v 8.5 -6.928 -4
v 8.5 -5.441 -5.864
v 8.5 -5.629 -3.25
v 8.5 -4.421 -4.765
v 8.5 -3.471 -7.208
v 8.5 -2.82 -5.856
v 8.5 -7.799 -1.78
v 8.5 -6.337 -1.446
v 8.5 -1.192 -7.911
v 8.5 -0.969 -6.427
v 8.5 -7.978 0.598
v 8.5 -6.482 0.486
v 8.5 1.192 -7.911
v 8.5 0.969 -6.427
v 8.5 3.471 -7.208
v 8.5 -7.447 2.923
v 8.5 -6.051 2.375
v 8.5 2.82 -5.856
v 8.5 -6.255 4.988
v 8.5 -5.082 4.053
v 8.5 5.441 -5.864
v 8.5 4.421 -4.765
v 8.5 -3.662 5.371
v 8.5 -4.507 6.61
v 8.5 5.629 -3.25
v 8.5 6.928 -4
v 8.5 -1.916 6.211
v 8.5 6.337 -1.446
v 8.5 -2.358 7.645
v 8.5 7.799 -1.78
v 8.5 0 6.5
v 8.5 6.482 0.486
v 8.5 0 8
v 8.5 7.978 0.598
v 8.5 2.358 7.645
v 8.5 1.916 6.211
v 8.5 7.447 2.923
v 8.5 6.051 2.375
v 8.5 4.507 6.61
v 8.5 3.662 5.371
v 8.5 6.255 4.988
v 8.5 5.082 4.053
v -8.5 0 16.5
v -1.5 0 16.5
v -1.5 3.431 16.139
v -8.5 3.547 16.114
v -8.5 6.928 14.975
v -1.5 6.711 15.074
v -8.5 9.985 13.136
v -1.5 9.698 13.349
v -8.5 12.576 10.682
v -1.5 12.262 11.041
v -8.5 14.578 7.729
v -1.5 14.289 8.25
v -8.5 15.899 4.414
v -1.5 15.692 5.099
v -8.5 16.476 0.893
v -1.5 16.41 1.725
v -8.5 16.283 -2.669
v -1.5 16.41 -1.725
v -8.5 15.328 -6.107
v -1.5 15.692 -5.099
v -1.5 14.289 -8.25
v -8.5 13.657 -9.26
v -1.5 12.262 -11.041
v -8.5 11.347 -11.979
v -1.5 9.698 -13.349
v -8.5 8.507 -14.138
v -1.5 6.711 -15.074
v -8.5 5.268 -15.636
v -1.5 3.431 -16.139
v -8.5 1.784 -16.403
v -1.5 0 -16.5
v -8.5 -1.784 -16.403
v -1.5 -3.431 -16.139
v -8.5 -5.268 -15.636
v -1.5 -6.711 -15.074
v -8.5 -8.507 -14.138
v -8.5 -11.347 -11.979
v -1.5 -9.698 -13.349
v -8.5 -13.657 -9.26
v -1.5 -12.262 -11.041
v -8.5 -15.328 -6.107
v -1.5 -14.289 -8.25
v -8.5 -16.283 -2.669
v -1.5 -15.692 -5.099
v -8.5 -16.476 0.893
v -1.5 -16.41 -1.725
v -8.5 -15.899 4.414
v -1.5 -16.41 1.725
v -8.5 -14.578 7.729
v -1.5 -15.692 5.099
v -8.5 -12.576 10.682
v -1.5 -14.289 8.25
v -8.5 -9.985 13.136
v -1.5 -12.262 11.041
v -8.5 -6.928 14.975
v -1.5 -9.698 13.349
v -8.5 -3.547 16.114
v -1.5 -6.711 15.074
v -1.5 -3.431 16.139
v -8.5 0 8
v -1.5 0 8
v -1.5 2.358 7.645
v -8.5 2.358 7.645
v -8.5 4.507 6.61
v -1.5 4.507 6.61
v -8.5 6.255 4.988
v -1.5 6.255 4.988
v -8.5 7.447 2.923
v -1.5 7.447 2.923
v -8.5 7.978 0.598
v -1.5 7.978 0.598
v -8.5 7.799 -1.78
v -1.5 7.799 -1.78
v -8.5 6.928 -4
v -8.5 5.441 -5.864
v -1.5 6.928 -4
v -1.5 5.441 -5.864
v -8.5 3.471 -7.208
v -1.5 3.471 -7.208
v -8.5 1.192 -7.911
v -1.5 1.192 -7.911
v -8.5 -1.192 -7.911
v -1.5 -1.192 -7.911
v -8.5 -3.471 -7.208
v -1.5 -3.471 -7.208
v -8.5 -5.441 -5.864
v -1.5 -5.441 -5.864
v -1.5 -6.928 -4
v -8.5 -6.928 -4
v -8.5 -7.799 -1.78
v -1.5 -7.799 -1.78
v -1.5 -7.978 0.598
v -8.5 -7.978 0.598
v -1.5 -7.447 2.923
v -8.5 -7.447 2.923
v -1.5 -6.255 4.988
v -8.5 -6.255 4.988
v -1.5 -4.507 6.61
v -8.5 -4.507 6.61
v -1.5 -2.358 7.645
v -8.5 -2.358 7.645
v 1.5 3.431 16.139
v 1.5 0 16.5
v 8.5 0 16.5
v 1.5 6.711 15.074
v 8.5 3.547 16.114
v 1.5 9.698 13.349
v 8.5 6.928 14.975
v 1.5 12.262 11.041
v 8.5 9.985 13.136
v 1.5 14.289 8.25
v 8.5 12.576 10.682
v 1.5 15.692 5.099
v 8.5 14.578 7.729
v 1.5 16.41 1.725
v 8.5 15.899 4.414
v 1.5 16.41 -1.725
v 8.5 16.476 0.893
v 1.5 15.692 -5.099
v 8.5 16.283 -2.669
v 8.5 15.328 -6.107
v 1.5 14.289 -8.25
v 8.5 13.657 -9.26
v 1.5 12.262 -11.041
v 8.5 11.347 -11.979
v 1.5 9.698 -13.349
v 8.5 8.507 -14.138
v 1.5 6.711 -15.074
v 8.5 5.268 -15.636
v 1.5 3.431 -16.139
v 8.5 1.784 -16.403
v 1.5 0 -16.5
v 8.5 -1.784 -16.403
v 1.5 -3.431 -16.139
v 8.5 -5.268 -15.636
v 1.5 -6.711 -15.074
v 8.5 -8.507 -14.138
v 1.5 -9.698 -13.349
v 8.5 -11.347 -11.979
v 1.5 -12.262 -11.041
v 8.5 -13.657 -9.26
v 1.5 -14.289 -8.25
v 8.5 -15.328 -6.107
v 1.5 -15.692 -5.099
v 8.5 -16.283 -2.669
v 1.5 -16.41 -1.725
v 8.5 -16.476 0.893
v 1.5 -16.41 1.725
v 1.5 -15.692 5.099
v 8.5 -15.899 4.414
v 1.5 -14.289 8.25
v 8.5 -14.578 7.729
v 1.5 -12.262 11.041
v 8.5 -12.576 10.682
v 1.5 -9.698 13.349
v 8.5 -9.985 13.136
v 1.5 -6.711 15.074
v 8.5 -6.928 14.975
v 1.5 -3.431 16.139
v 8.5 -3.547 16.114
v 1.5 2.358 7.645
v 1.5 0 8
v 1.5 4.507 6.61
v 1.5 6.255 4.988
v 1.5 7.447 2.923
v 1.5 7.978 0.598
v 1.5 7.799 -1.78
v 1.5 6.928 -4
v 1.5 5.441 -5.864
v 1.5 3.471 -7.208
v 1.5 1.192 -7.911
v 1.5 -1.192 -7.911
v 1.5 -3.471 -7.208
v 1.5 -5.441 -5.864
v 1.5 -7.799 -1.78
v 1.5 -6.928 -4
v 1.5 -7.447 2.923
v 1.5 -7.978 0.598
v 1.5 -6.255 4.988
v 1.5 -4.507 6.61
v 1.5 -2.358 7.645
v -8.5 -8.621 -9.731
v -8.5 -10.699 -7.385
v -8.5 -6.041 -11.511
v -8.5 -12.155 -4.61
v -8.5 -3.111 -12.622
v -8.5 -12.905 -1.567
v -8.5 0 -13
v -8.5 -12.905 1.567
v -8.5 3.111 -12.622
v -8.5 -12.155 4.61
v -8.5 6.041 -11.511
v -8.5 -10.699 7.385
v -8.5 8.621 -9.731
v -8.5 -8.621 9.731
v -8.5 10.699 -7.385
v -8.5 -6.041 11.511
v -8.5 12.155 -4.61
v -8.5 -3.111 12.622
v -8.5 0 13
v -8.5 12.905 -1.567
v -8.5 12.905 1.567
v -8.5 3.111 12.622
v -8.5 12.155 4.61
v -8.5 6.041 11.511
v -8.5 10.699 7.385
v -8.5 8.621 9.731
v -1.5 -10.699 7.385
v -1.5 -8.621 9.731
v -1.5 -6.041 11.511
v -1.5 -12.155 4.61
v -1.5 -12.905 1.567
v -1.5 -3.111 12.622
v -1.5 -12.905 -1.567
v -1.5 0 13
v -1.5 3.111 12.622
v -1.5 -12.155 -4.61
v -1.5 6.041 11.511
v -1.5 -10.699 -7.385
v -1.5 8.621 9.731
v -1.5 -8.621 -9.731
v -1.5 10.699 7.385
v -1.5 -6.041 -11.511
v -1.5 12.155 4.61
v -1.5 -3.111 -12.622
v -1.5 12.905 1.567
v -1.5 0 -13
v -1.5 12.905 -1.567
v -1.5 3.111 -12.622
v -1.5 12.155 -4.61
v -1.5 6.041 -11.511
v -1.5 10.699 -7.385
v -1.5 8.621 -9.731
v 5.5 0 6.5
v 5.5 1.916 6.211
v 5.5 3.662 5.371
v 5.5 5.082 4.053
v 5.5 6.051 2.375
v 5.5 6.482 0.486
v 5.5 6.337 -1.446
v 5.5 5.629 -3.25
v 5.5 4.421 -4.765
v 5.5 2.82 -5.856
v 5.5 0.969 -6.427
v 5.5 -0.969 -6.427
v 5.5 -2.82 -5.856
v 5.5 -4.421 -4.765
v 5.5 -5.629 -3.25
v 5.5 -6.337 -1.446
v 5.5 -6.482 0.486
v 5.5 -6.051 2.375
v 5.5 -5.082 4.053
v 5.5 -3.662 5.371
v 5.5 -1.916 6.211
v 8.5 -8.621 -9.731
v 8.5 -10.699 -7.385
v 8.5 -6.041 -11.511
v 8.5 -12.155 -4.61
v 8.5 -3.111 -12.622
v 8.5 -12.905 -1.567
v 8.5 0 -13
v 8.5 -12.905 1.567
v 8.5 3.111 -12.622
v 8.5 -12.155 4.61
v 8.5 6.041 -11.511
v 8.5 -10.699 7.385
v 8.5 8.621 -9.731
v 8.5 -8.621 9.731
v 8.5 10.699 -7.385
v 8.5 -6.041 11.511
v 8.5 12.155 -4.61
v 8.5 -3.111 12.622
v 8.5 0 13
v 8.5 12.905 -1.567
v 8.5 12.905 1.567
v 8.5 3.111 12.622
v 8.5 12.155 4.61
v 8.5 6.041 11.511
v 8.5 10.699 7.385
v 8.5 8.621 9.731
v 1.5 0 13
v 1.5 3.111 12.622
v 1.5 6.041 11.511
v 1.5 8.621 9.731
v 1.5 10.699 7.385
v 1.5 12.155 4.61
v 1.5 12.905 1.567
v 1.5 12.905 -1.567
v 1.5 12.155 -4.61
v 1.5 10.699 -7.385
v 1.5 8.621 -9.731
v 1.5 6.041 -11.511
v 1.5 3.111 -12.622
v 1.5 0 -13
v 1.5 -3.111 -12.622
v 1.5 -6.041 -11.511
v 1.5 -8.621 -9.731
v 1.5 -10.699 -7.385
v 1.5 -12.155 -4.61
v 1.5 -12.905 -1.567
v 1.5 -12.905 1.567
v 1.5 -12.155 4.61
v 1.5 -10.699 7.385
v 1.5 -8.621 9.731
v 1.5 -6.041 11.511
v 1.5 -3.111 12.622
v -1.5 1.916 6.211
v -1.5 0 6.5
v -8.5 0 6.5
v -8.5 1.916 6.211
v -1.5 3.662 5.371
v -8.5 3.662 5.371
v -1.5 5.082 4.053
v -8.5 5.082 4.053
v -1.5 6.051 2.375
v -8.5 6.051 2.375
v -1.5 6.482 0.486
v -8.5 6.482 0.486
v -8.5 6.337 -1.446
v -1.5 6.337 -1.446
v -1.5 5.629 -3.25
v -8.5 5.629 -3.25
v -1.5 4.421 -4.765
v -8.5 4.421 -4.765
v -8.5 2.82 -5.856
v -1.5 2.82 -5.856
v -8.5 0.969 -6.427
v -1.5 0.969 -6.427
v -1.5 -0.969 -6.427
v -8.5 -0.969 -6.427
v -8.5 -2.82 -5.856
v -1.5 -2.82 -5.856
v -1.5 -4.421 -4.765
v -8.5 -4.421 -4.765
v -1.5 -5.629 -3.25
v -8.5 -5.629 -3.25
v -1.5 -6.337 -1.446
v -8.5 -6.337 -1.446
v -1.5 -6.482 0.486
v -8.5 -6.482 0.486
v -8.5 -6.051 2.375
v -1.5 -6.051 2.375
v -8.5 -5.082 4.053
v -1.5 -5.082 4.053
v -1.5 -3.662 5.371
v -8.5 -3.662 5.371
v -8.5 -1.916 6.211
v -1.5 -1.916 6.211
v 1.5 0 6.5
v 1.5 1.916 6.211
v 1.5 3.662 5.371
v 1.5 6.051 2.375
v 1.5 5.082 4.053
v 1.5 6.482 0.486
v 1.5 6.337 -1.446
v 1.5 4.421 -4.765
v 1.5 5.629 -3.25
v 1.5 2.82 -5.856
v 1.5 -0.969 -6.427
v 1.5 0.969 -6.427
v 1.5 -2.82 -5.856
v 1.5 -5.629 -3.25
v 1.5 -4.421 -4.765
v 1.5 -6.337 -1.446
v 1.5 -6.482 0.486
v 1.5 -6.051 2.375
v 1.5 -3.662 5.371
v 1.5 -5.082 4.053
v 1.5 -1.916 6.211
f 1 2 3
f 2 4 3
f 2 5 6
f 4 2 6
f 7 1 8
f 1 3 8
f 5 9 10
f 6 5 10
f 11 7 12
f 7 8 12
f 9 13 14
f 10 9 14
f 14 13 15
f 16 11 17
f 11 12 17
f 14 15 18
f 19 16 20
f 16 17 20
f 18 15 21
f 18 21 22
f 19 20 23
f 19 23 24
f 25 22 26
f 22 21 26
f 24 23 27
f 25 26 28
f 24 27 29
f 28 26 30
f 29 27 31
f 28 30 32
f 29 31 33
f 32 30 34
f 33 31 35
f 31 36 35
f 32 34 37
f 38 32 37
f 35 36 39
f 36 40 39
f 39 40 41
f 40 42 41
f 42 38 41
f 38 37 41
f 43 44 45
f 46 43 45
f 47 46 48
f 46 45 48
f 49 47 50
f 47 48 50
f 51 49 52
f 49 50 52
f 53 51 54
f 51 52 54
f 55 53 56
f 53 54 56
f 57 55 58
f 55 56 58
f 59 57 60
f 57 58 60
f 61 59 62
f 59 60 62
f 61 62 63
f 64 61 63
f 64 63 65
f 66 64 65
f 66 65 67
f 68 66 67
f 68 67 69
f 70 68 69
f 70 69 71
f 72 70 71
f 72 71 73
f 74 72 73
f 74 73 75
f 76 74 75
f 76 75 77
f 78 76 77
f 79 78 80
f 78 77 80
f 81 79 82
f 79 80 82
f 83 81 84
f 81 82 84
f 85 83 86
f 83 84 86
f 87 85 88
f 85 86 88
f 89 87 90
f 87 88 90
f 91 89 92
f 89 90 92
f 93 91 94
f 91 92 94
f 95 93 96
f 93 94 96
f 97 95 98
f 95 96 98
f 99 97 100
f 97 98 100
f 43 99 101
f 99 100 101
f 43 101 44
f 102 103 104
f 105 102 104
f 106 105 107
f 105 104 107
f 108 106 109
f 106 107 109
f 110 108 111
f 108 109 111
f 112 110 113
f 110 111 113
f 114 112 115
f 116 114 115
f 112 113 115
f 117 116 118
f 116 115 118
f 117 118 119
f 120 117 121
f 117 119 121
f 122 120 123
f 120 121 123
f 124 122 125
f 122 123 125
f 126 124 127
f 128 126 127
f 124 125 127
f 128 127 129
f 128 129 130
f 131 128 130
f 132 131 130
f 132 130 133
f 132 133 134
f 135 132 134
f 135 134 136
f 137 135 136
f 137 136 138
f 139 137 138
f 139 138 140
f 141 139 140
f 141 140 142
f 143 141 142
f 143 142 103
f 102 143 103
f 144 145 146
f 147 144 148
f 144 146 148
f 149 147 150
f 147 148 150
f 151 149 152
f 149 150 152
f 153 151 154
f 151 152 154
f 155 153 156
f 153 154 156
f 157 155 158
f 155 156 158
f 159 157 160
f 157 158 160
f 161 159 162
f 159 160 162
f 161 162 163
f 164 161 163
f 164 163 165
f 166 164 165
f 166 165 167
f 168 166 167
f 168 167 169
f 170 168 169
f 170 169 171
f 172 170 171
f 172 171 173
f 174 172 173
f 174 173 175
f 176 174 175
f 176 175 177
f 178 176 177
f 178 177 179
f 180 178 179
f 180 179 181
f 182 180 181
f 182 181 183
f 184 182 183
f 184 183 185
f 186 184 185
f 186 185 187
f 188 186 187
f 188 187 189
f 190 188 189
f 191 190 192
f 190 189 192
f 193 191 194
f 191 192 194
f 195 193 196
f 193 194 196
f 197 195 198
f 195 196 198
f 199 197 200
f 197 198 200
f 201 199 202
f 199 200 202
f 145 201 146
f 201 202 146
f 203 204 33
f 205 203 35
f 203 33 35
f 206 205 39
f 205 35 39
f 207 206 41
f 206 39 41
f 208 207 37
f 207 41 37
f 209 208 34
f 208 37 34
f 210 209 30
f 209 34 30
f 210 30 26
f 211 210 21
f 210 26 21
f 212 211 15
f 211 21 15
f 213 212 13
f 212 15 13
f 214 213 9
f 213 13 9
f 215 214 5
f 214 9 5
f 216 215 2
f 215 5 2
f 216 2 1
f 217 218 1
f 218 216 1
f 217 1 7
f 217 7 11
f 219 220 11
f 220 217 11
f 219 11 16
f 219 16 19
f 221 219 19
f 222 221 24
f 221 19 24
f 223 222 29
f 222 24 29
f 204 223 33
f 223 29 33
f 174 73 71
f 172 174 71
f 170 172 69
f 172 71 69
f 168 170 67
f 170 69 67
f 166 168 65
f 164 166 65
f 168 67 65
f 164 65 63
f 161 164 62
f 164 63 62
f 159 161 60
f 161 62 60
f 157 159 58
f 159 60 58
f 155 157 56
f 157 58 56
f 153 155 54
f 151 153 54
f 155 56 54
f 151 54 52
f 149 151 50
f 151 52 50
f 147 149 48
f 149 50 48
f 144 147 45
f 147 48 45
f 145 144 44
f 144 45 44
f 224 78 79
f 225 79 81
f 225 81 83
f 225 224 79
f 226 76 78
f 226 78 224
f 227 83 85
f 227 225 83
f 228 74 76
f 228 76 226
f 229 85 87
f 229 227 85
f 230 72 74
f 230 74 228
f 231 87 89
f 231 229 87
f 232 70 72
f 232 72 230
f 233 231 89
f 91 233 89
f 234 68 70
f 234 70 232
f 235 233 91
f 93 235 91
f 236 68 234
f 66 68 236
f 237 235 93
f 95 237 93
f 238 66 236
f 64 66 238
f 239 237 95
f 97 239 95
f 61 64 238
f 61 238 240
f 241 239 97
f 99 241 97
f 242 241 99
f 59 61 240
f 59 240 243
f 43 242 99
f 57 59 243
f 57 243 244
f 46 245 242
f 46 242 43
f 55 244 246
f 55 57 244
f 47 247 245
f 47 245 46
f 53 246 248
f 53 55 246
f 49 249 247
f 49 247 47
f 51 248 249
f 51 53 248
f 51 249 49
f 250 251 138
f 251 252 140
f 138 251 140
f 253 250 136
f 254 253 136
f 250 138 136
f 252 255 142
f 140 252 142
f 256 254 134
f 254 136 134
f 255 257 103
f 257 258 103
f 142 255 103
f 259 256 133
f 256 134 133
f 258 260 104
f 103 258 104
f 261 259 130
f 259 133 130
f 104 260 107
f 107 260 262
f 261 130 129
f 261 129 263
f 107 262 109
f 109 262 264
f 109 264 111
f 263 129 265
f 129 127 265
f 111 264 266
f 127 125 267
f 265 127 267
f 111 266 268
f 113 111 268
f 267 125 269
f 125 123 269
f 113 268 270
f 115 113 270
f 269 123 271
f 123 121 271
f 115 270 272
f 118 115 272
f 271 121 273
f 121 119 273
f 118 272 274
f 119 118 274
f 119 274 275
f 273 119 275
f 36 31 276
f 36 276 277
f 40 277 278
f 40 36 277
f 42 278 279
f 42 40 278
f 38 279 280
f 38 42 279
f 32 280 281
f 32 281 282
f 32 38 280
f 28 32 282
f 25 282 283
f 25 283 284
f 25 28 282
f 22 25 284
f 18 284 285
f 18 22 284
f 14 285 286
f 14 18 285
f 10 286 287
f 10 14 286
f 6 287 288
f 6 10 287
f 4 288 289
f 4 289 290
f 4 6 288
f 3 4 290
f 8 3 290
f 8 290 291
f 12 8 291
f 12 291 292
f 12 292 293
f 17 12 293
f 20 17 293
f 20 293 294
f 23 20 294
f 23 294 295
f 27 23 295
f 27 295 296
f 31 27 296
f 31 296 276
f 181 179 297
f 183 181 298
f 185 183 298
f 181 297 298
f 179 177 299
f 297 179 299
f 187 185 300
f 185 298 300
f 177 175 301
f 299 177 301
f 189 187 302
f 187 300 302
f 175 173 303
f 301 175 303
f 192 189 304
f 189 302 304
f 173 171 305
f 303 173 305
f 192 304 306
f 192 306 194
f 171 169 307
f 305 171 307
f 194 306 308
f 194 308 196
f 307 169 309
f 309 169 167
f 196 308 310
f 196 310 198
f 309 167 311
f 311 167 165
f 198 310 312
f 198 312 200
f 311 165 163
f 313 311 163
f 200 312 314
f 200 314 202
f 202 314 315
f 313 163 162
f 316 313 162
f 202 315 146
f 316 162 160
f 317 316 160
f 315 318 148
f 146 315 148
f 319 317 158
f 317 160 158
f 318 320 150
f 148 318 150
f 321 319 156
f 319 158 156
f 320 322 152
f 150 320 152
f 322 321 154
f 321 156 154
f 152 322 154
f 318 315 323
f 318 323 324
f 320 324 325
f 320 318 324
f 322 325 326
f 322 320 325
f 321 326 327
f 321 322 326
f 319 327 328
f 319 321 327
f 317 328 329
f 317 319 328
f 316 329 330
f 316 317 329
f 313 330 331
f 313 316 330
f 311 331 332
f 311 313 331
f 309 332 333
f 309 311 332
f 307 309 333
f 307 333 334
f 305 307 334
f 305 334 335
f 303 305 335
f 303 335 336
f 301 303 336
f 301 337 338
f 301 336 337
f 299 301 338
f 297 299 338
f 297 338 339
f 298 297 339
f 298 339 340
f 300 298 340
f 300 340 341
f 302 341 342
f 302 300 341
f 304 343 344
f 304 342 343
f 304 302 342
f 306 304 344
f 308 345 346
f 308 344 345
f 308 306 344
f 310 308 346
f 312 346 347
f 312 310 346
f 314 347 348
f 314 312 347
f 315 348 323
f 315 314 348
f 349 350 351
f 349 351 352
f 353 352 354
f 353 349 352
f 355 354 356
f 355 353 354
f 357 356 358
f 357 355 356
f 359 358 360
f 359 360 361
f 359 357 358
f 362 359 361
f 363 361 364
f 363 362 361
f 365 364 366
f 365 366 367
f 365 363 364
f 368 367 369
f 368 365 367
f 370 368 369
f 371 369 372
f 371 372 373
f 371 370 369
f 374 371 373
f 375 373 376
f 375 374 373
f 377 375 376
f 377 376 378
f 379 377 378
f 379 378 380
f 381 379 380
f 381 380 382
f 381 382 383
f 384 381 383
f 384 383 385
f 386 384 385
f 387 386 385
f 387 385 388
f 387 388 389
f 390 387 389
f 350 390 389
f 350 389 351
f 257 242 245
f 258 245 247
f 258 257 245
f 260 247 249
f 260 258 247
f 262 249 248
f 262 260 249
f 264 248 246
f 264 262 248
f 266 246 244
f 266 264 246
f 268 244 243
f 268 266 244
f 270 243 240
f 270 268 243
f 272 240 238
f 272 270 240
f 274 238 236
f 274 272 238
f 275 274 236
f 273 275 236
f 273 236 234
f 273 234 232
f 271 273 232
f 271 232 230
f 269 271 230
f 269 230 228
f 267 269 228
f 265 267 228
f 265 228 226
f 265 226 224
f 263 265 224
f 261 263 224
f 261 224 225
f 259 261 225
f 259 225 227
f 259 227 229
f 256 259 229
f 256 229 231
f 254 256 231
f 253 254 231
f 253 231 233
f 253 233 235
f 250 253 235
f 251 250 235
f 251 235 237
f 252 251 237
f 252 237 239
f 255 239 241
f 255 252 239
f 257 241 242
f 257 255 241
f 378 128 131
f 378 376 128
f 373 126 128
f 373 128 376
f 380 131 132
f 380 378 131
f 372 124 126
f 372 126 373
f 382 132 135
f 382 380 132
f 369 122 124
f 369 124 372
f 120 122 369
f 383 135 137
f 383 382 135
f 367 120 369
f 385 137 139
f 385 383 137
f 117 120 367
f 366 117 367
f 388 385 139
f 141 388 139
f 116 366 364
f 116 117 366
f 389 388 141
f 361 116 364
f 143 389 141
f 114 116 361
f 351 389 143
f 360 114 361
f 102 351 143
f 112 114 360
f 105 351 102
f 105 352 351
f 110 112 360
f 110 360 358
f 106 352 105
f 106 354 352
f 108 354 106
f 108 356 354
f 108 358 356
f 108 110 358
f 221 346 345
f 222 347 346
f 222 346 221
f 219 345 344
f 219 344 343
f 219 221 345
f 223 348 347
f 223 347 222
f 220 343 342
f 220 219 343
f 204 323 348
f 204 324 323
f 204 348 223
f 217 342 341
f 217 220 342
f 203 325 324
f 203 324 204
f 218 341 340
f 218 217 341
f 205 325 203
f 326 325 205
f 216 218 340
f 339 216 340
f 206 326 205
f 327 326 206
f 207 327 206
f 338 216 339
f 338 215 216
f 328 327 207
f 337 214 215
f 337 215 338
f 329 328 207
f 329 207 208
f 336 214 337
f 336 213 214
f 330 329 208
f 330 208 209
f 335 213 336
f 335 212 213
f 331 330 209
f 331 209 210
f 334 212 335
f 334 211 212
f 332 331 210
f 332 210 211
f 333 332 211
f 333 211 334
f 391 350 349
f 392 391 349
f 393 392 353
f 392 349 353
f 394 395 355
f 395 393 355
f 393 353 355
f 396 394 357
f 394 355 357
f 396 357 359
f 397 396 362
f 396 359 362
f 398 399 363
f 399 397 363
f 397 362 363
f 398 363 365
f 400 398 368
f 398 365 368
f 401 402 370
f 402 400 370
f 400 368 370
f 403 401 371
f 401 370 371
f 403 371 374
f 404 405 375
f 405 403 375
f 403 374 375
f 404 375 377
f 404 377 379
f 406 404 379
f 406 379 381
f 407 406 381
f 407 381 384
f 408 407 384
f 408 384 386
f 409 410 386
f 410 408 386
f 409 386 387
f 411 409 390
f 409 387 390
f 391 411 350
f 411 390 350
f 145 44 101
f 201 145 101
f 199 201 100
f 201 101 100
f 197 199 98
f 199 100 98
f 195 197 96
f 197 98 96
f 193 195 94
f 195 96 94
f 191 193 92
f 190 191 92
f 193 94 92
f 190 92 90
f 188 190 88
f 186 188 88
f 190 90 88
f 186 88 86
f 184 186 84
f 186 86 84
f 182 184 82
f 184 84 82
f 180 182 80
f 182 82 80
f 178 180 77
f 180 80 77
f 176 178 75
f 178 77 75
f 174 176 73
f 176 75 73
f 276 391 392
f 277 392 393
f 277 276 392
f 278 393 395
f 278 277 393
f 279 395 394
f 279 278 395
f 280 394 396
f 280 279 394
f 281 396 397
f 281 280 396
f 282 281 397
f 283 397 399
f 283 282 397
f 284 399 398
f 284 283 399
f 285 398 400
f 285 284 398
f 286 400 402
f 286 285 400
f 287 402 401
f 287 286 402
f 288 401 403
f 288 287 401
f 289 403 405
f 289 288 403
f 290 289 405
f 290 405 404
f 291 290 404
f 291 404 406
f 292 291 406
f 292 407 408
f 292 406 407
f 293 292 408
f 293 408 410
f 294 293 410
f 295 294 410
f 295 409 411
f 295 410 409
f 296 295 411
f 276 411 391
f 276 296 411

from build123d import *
from build123d.topology import SkipClean

# Parameters (mm, degrees)
SALIENTE_EXTRUIR1_DEPTH      = 1.5
SALIENTE_EXTRUIR1_DEPTH_BACK = 1.5
CROQUIS2_R                   = 16.5
SALIENTE_EXTRUIR2_DEPTH      = 7
SALIENTE_EXTRUIR2_DEPTH_BACK = 10
CROQUIS3_R                   = 16.5
CROQUIS3_R_2                 = 13
CROQUIS3_R_3                 = 8
CROQUIS3_R_4                 = 6.5
CROQUIS4_R                   = 6.5
CORTAR_EXTRUIR1_DEPTH        = 7


with BuildPart() as part:
    # Croquis2 → Saliente-Extruir1 (new, two sides: drawn at the far end of the back side and taken through both)
    with BuildSketch(Plane(origin=(0, 0, 0), x_dir=(0, 0, -1), z_dir=(1, 0, 0)).offset(-SALIENTE_EXTRUIR1_DEPTH_BACK)):
        Circle(CROQUIS2_R)
    extrude(amount=SALIENTE_EXTRUIR1_DEPTH + SALIENTE_EXTRUIR1_DEPTH_BACK)

    # Croquis3 → Saliente-Extruir2 (add, two sides: drawn at the far end of the back side and taken through both)
    # profile 1 of 2: a face of its own
    with SkipClean():  # the faces are left unmerged after this step: merging them gives an invalid solid
        with BuildSketch(Plane.ZY.offset(1.5).offset(-SALIENTE_EXTRUIR2_DEPTH_BACK)):
            Circle(CROQUIS3_R)
            Circle(CROQUIS3_R_2, mode=Mode.SUBTRACT)
        # profile 2 of 2: a face of its own
        with BuildSketch(Plane.ZY.offset(1.5).offset(-SALIENTE_EXTRUIR2_DEPTH_BACK)):
            Circle(CROQUIS3_R_3)
            Circle(CROQUIS3_R_4, mode=Mode.SUBTRACT)
        extrude(amount=SALIENTE_EXTRUIR2_DEPTH + SALIENTE_EXTRUIR2_DEPTH_BACK)

    # Croquis4 → Cortar-Extruir1 (cut)
    with SkipClean():  # the faces are left unmerged after this step: merging them gives an invalid solid
        with BuildSketch(Plane.ZY.offset(1.5)):
            Circle(CROQUIS4_R)
        extrude(amount=-CORTAR_EXTRUIR1_DEPTH, mode=Mode.SUBTRACT)


solid = part.part
